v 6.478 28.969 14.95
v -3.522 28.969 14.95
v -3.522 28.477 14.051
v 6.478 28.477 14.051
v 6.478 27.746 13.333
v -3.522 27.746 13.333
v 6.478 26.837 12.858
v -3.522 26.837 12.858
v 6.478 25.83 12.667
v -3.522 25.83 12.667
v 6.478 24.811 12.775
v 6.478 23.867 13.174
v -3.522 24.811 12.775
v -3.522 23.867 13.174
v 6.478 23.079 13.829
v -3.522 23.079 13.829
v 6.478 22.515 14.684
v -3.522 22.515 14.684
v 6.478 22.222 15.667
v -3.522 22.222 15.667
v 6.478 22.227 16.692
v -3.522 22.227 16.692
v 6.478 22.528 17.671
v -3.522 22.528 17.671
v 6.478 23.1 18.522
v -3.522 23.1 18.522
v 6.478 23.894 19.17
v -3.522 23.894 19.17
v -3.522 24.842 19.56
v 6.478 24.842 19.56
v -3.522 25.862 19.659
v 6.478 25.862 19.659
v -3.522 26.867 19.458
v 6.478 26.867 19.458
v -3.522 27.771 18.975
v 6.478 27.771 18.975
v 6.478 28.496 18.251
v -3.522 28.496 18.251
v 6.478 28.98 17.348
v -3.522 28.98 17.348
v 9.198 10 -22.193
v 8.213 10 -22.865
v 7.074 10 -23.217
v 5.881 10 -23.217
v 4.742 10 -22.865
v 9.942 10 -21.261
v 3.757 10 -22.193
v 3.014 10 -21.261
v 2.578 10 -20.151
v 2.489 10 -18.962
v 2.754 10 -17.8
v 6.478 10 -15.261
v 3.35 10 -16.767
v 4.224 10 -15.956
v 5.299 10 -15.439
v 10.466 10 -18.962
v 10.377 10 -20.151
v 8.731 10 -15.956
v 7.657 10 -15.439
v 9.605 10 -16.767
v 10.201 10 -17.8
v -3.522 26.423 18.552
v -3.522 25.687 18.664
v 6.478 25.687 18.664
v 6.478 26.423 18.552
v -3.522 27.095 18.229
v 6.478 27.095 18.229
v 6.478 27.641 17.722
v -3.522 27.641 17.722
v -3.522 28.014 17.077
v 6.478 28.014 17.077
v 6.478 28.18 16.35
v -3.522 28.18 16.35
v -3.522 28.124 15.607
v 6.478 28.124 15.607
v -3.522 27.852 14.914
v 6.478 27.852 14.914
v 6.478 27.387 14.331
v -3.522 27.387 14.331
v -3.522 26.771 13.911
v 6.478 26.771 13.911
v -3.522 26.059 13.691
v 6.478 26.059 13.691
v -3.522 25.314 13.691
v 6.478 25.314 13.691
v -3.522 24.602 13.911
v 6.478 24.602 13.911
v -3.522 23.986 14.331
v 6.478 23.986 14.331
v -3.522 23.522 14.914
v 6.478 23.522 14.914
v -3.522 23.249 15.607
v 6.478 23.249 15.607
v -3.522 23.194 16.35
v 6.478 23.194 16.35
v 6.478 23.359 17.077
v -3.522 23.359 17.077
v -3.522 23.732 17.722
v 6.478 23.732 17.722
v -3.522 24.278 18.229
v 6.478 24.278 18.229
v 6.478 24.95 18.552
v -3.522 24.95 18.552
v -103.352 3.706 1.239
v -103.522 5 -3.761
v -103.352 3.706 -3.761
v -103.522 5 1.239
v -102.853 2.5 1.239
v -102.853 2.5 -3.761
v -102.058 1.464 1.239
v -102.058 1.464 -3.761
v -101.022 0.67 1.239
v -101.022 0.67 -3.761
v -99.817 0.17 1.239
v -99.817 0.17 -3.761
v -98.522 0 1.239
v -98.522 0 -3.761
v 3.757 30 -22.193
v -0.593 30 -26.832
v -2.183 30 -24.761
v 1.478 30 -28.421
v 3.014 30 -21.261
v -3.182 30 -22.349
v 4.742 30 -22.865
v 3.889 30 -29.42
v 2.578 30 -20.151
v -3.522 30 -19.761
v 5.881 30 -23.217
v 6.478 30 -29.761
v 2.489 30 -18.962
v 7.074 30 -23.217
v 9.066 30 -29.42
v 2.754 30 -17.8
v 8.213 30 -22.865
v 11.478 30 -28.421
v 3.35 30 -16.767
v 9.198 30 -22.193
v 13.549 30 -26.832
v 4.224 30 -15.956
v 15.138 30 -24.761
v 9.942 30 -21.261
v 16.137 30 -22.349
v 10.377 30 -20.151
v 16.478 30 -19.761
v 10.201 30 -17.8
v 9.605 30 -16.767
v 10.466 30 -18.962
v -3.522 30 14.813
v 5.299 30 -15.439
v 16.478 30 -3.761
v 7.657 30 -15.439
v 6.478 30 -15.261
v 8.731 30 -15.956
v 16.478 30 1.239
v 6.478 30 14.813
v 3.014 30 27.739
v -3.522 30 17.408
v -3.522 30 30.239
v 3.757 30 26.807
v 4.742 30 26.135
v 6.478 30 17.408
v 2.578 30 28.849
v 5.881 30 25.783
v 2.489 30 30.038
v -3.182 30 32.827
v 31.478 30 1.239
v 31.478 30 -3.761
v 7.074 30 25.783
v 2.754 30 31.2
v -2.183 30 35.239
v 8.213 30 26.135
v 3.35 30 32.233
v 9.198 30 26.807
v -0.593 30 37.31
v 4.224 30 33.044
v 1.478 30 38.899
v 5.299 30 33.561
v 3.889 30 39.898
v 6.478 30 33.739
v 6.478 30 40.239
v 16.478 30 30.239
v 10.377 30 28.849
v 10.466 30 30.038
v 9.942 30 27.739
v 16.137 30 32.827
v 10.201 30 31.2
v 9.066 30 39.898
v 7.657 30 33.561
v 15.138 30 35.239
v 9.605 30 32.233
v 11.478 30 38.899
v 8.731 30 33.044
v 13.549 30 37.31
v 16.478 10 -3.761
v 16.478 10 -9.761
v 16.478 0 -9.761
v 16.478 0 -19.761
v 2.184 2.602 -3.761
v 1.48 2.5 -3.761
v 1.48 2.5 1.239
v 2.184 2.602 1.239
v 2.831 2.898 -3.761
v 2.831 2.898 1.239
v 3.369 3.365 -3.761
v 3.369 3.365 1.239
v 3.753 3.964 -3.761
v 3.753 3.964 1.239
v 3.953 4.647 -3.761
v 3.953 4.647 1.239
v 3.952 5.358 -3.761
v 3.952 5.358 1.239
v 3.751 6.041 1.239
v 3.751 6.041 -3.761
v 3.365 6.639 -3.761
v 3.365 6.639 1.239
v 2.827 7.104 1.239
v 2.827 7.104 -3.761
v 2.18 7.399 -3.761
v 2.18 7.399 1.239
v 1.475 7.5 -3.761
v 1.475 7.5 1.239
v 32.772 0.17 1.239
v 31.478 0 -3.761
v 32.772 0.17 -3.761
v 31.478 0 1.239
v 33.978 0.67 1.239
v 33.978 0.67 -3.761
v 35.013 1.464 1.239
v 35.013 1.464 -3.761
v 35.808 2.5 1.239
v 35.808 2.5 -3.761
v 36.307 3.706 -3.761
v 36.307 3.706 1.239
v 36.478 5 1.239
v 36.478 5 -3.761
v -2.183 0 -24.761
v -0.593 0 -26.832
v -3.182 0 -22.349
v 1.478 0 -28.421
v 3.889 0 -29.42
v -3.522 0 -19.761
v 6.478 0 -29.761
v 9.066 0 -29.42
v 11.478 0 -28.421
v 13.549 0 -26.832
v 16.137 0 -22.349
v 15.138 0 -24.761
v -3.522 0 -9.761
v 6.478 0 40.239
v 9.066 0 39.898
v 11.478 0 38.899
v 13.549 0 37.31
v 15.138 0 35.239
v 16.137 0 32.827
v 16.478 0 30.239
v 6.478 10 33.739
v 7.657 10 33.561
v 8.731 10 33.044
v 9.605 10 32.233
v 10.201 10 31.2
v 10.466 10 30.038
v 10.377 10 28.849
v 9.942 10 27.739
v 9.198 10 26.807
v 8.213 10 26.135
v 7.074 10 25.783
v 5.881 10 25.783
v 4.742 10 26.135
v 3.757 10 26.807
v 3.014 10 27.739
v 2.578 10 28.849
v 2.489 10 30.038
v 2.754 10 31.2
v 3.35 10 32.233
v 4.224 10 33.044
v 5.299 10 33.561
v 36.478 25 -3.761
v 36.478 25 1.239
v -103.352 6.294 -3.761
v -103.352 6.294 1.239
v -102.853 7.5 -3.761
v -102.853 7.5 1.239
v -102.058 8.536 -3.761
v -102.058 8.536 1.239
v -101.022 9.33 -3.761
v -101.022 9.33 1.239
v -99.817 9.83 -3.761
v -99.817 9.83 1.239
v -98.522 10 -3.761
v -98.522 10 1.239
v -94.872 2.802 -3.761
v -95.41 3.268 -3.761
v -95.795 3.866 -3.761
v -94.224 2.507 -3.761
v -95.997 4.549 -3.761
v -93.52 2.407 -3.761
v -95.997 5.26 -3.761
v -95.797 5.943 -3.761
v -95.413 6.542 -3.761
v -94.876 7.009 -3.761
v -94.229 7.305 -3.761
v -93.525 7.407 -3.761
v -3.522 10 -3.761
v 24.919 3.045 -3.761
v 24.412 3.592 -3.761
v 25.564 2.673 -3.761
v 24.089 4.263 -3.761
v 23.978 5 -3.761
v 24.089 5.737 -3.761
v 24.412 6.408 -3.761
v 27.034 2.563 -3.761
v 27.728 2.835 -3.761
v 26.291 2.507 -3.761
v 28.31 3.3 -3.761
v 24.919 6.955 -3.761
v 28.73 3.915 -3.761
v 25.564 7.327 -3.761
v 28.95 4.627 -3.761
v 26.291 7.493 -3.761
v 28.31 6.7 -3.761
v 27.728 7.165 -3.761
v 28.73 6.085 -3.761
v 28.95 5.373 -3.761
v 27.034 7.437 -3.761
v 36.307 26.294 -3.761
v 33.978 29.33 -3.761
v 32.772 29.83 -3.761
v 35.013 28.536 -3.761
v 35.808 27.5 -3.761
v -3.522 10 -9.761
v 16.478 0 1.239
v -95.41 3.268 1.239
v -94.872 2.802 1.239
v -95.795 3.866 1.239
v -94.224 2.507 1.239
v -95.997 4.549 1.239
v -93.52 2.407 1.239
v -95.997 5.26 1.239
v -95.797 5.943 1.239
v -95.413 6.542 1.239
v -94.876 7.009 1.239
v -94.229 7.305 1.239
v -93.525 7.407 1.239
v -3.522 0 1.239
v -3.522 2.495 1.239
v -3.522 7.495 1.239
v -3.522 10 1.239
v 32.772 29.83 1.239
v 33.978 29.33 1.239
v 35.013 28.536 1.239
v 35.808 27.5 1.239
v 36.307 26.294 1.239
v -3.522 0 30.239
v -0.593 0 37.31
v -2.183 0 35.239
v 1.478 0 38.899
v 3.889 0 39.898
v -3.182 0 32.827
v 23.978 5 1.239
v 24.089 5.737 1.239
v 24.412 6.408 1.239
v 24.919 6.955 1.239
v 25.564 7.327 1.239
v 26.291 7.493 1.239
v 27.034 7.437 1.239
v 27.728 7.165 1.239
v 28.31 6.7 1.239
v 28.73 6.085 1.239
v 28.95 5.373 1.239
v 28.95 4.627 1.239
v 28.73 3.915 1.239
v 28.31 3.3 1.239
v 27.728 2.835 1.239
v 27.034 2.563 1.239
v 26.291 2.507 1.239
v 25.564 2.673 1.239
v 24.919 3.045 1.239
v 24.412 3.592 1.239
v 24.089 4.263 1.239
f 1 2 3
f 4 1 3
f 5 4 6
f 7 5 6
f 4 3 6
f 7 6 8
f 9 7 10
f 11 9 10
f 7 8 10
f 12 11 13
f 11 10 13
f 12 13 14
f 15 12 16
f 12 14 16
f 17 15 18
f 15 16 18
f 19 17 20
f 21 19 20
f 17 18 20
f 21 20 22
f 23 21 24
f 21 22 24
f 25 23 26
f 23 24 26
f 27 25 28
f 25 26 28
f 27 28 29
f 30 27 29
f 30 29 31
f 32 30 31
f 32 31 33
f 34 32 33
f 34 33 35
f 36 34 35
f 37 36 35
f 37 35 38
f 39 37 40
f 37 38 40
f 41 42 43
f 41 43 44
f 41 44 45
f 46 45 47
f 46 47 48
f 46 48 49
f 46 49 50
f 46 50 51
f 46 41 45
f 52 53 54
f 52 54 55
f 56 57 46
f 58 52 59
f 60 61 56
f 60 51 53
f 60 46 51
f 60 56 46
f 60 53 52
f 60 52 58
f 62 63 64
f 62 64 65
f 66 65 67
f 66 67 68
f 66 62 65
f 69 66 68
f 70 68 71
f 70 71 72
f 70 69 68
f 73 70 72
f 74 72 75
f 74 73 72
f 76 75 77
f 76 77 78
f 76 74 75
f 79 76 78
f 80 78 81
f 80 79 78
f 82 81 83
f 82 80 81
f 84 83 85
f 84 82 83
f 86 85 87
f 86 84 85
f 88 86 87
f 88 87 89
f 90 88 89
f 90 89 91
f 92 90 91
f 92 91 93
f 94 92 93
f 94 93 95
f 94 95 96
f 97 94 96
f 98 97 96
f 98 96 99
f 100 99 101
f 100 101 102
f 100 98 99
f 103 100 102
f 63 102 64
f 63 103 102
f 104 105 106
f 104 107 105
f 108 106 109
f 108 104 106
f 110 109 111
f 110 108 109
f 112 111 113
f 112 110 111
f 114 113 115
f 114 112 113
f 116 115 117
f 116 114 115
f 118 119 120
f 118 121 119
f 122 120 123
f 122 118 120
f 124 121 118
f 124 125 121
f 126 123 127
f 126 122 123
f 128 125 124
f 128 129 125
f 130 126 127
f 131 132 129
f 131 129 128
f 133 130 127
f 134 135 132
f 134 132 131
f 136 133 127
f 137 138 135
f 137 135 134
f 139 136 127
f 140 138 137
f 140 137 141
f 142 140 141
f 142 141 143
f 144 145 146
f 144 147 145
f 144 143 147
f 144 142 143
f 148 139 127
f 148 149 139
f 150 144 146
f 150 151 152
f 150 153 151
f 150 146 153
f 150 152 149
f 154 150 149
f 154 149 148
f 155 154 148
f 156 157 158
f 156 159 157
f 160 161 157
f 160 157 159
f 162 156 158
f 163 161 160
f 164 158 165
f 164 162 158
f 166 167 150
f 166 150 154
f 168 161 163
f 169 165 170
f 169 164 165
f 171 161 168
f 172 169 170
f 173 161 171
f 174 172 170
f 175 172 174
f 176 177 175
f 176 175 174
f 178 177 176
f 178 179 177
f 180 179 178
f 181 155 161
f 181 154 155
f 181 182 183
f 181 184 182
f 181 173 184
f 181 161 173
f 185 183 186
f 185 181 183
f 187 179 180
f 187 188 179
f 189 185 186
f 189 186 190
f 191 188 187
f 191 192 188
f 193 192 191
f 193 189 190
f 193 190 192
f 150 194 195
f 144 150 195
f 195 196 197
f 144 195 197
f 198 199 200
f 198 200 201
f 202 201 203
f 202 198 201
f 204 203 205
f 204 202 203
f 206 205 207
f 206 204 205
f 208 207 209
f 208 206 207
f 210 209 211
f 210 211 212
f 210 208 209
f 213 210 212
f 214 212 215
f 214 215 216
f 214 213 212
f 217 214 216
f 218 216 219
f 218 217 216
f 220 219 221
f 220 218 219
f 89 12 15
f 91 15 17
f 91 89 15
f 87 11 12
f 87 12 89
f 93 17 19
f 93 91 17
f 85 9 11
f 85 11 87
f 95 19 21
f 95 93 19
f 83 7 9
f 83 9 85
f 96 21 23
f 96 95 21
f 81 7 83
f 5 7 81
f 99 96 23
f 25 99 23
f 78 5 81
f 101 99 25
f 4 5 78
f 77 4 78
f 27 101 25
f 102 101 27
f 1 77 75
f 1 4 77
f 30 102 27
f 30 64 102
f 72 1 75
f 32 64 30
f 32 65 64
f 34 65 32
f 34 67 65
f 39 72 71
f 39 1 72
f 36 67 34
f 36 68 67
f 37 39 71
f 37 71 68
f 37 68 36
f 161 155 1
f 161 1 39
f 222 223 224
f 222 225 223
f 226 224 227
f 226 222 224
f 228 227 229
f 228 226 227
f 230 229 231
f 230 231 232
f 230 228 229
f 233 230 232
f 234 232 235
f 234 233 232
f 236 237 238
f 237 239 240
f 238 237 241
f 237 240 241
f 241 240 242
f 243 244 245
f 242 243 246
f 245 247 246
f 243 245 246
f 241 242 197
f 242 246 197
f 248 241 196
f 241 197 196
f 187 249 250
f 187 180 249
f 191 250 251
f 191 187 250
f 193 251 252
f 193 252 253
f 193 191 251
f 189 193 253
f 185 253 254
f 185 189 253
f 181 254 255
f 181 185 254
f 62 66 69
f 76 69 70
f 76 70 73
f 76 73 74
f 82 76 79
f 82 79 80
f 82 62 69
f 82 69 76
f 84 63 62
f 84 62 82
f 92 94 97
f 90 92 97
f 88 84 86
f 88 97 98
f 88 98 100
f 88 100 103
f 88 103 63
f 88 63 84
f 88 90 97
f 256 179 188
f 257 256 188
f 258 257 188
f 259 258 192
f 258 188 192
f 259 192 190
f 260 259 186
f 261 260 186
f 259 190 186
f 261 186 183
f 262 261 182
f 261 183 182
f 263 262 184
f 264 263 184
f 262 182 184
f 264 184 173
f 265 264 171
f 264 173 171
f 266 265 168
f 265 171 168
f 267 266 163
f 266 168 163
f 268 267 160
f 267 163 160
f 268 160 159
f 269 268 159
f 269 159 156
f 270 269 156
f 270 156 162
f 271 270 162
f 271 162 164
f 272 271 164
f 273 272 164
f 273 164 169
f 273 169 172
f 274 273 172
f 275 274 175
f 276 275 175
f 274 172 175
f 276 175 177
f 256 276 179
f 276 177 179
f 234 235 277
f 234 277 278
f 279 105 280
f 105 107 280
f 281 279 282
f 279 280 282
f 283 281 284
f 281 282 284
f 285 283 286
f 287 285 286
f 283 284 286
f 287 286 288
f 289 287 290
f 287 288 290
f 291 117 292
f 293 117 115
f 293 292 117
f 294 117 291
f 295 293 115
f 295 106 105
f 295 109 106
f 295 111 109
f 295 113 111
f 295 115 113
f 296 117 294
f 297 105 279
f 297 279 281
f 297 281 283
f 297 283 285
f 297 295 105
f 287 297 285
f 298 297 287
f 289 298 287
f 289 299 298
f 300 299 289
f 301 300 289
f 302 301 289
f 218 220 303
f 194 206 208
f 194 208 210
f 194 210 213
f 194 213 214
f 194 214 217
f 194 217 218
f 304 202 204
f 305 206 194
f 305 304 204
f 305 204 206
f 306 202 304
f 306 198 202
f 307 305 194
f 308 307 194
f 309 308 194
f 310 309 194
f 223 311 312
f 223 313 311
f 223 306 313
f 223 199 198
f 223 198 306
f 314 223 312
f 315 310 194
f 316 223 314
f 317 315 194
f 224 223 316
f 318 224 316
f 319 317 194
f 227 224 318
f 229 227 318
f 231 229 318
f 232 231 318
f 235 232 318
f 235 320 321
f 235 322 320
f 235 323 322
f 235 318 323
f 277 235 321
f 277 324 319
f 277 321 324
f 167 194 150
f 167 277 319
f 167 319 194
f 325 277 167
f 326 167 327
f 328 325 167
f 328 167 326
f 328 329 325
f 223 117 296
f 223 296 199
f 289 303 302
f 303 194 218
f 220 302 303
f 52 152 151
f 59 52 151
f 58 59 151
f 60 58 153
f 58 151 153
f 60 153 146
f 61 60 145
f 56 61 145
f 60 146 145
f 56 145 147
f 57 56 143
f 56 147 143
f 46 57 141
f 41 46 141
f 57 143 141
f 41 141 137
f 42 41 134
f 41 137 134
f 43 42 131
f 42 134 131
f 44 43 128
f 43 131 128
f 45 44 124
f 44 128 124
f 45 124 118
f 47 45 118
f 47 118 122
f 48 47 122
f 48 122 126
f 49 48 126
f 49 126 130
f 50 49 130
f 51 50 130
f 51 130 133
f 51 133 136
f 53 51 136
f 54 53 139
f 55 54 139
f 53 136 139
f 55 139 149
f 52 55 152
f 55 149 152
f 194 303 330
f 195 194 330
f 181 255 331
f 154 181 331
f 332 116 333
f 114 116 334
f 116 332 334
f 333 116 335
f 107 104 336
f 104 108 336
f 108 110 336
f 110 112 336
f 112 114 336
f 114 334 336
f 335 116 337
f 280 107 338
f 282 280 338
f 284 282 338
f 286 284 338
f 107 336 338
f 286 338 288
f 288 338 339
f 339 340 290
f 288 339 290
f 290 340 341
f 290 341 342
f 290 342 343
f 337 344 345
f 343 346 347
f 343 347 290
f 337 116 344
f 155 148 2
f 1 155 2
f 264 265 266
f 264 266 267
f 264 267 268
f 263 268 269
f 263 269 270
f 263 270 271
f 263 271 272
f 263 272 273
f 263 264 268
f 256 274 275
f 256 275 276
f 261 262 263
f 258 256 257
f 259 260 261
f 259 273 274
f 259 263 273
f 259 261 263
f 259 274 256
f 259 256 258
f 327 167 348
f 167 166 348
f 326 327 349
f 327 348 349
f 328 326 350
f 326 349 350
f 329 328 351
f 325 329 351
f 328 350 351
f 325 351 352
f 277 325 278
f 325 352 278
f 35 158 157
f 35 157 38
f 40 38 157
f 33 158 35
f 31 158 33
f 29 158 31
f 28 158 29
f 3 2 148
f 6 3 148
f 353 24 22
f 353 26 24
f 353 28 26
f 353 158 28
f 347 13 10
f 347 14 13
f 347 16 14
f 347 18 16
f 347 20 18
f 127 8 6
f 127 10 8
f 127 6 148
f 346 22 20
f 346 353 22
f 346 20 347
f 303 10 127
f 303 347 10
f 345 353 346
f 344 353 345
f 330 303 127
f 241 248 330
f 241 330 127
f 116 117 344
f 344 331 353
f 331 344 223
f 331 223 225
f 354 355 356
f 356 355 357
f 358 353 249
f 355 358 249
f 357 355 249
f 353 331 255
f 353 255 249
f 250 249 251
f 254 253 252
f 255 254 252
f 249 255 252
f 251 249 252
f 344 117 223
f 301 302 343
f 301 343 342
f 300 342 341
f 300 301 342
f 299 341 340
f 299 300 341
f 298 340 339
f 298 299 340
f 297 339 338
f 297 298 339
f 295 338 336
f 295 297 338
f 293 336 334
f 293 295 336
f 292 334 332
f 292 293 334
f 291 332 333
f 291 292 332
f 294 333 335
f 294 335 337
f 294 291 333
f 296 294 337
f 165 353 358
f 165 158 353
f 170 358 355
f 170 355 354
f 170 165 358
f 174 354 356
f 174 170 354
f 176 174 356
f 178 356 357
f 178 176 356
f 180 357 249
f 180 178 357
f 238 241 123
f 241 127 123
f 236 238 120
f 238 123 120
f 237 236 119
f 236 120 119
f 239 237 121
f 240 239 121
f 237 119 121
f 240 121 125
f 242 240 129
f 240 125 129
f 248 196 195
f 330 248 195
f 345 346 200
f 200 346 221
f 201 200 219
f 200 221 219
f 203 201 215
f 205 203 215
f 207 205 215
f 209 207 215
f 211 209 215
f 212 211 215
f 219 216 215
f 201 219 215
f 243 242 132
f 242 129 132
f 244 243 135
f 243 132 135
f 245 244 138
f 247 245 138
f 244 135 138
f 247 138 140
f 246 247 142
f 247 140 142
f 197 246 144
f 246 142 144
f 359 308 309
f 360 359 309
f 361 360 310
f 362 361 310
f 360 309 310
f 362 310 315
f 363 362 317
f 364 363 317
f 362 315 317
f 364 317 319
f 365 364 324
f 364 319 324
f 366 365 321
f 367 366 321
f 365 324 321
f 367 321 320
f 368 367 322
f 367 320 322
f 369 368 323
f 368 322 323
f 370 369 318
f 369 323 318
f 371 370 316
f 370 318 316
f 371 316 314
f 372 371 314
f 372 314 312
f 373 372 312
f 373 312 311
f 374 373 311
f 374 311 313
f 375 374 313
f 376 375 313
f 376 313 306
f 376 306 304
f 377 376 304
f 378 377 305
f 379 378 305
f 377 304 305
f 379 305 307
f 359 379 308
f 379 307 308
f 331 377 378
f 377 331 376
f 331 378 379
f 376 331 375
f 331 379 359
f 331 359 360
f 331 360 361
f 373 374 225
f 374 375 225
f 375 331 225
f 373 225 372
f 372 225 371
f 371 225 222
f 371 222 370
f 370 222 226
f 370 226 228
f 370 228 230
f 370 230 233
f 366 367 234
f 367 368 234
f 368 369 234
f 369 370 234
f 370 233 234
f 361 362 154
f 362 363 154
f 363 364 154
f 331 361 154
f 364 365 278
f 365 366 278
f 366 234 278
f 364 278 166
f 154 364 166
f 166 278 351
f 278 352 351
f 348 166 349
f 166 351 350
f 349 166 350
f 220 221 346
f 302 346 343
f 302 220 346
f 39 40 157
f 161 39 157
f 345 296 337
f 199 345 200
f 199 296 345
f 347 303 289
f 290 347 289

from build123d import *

# Parameters (mm, degrees)
SKETCH2_W                = 20
SKETCH2_H                = 70
BOSS_EXTRUDE1_DEPTH      = 30
SKETCH3_R                = 4
CUT_EXTRUDE1_DEPTH       = 20
SKETCH4_R                = 2.5
CUT_EXTRUDE2_DEPTH       = 10
FILLET1_R                = 10
BOSS_EXTRUDE2_DEPTH      = 100
BOSS_EXTRUDE2_DEPTH_BACK = 40
SKETCH5_W                = 5
SKETCH5_H                = 30
SKETCH6_R                = 2.5
SKETCH6_W                = 100
SKETCH6_H                = 20
CUT_EXTRUDE3_DEPTH       = 5
FILLET2_R                = 5
CUT_EXTRUDE5_REACH       = 132.074
SKETCH8_W                = 6
SKETCH8_H                = 10


with BuildPart() as part:
    # Sketch2 → Boss-Extrude1 (new body)
    with BuildSketch(Plane(origin=(0, 0, 0), x_dir=(1, 0, 0), z_dir=(0, 1, 0))):
        with Locations((6.47761194, -5.23880597)):
            Rectangle(SKETCH2_W, SKETCH2_H)
    extrude(amount=BOSS_EXTRUDE1_DEPTH)

    # Sketch3 → Cut-Extrude1 (cut)
    with BuildSketch(Plane(origin=(0, 30, 0), x_dir=(1, 0, 0), z_dir=(0, 1, 0))):
        with Locations(Location((6.47761194, 19.26119403, 0), (0, 0, 270))):
            Circle(SKETCH3_R)
        with Locations(Location((6.47761194, -29.73880597, 0), (0, 0, 270))):
            Circle(SKETCH3_R)
    extrude(amount=-CUT_EXTRUDE1_DEPTH, mode=Mode.SUBTRACT)

    # Sketch4 → Cut-Extrude2 (cut)
    with BuildSketch(Plane.ZY.offset(3.52238806)):
        with BuildLine():
            Line((17.415034126, 30.126407987), (14.795699792, 30.126407987))
            Line((14.795699792, 30.126407987), (14.949961333, 28.969446425))
            ThreePointArc((14.949961333, 28.969446425), (16.17927412, 22.186618473), (17.347611009, 28.980215007))
            Line((17.347611009, 28.980215007), (17.415034126, 30.126407987))
        make_face()
        with Locations((16.163554702, 25.686583173)):
            Circle(SKETCH4_R, mode=Mode.SUBTRACT)
    extrude(amount=-CUT_EXTRUDE2_DEPTH, mode=Mode.SUBTRACT)

    # Fillet1
    fillet1_edges = [part.edges().sort_by_distance(p)[0] for p in [
        (-3.52238806, 15, -29.76119403),
        (16.47761194, 15, -29.76119403),
        (16.47761194, 15, 40.23880597),
        (-3.52238806, 15, 40.23880597),
    ]]
    fillet(fillet1_edges, radius=FILLET1_R - 0.0001)  # a hair under: the kernel refuses the full size

    # Sketch5 → Boss-Extrude2 (add, two sides: drawn at the far end of the back side and taken through both)
    with BuildSketch(Plane.ZY.offset(3.52238806).offset(-BOSS_EXTRUDE2_DEPTH_BACK)):
        with Locations((-1.26119403, 15)):
            Rectangle(SKETCH5_W, SKETCH5_H)
    extrude(amount=BOSS_EXTRUDE2_DEPTH + BOSS_EXTRUDE2_DEPTH_BACK)

    # Sketch6 → Cut-Extrude3 (cut)
    with BuildSketch(Plane(origin=(0, 0, -3.76119403), x_dir=(-1, 0, 0), z_dir=(0, 0, -1))):
        with Locations((-26.47761194, 5)):
            Circle(SKETCH6_R)
        with Locations((53.52238806, 20)):
            Rectangle(SKETCH6_W, SKETCH6_H)
        with BuildLine():
            Line((93.519935535, 2.406805213), (-1.480064465, 2.500001203))
            ThreePointArc((-1.480064465, 2.500001203), (-3.977610737, 5.002452525), (-1.475159415, 7.499998797))
            Line((-1.475159415, 7.499998797), (93.524840585, 7.406802807))
            ThreePointArc((93.524840585, 7.406802807), (96.022386857, 4.904351485), (93.519935535, 2.406805213))
        make_face()
    extrude(amount=-CUT_EXTRUDE3_DEPTH, mode=Mode.SUBTRACT)

    # Fillet2
    fillet2_edges = [part.edges().sort_by_distance(p)[0] for p in [
        (36.47761194, 30, -1.26119403),
        (36.47761194, 0, -1.26119403),
        (-103.52238806, 10, -1.26119403),
        (-103.52238806, 0, -1.26119403),
    ]]
    fillet(fillet2_edges, radius=FILLET2_R - 0.0001)  # a hair under: the kernel refuses the full size

    # Sketch8 → Cut-Extrude5 (cut, up to next)
    with BuildSketch(Plane(origin=(16.47761194, 0, 0), x_dir=(0, 0, -1), z_dir=(1, 0, 0)), mode=Mode.PRIVATE) as cut_extrude5_sk1:
        with Locations((6.76119403, 5)):
            Rectangle(SKETCH8_W, SKETCH8_H)
    cut_extrude5_tool1 = extrude(cut_extrude5_sk1.sketch, amount=-CUT_EXTRUDE5_REACH, mode=Mode.PRIVATE) & part.part
    add(cut_extrude5_tool1.solids().sort_by_distance((16.477612, 5, -6.761194))[0], mode=Mode.SUBTRACT)


solid = part.part
